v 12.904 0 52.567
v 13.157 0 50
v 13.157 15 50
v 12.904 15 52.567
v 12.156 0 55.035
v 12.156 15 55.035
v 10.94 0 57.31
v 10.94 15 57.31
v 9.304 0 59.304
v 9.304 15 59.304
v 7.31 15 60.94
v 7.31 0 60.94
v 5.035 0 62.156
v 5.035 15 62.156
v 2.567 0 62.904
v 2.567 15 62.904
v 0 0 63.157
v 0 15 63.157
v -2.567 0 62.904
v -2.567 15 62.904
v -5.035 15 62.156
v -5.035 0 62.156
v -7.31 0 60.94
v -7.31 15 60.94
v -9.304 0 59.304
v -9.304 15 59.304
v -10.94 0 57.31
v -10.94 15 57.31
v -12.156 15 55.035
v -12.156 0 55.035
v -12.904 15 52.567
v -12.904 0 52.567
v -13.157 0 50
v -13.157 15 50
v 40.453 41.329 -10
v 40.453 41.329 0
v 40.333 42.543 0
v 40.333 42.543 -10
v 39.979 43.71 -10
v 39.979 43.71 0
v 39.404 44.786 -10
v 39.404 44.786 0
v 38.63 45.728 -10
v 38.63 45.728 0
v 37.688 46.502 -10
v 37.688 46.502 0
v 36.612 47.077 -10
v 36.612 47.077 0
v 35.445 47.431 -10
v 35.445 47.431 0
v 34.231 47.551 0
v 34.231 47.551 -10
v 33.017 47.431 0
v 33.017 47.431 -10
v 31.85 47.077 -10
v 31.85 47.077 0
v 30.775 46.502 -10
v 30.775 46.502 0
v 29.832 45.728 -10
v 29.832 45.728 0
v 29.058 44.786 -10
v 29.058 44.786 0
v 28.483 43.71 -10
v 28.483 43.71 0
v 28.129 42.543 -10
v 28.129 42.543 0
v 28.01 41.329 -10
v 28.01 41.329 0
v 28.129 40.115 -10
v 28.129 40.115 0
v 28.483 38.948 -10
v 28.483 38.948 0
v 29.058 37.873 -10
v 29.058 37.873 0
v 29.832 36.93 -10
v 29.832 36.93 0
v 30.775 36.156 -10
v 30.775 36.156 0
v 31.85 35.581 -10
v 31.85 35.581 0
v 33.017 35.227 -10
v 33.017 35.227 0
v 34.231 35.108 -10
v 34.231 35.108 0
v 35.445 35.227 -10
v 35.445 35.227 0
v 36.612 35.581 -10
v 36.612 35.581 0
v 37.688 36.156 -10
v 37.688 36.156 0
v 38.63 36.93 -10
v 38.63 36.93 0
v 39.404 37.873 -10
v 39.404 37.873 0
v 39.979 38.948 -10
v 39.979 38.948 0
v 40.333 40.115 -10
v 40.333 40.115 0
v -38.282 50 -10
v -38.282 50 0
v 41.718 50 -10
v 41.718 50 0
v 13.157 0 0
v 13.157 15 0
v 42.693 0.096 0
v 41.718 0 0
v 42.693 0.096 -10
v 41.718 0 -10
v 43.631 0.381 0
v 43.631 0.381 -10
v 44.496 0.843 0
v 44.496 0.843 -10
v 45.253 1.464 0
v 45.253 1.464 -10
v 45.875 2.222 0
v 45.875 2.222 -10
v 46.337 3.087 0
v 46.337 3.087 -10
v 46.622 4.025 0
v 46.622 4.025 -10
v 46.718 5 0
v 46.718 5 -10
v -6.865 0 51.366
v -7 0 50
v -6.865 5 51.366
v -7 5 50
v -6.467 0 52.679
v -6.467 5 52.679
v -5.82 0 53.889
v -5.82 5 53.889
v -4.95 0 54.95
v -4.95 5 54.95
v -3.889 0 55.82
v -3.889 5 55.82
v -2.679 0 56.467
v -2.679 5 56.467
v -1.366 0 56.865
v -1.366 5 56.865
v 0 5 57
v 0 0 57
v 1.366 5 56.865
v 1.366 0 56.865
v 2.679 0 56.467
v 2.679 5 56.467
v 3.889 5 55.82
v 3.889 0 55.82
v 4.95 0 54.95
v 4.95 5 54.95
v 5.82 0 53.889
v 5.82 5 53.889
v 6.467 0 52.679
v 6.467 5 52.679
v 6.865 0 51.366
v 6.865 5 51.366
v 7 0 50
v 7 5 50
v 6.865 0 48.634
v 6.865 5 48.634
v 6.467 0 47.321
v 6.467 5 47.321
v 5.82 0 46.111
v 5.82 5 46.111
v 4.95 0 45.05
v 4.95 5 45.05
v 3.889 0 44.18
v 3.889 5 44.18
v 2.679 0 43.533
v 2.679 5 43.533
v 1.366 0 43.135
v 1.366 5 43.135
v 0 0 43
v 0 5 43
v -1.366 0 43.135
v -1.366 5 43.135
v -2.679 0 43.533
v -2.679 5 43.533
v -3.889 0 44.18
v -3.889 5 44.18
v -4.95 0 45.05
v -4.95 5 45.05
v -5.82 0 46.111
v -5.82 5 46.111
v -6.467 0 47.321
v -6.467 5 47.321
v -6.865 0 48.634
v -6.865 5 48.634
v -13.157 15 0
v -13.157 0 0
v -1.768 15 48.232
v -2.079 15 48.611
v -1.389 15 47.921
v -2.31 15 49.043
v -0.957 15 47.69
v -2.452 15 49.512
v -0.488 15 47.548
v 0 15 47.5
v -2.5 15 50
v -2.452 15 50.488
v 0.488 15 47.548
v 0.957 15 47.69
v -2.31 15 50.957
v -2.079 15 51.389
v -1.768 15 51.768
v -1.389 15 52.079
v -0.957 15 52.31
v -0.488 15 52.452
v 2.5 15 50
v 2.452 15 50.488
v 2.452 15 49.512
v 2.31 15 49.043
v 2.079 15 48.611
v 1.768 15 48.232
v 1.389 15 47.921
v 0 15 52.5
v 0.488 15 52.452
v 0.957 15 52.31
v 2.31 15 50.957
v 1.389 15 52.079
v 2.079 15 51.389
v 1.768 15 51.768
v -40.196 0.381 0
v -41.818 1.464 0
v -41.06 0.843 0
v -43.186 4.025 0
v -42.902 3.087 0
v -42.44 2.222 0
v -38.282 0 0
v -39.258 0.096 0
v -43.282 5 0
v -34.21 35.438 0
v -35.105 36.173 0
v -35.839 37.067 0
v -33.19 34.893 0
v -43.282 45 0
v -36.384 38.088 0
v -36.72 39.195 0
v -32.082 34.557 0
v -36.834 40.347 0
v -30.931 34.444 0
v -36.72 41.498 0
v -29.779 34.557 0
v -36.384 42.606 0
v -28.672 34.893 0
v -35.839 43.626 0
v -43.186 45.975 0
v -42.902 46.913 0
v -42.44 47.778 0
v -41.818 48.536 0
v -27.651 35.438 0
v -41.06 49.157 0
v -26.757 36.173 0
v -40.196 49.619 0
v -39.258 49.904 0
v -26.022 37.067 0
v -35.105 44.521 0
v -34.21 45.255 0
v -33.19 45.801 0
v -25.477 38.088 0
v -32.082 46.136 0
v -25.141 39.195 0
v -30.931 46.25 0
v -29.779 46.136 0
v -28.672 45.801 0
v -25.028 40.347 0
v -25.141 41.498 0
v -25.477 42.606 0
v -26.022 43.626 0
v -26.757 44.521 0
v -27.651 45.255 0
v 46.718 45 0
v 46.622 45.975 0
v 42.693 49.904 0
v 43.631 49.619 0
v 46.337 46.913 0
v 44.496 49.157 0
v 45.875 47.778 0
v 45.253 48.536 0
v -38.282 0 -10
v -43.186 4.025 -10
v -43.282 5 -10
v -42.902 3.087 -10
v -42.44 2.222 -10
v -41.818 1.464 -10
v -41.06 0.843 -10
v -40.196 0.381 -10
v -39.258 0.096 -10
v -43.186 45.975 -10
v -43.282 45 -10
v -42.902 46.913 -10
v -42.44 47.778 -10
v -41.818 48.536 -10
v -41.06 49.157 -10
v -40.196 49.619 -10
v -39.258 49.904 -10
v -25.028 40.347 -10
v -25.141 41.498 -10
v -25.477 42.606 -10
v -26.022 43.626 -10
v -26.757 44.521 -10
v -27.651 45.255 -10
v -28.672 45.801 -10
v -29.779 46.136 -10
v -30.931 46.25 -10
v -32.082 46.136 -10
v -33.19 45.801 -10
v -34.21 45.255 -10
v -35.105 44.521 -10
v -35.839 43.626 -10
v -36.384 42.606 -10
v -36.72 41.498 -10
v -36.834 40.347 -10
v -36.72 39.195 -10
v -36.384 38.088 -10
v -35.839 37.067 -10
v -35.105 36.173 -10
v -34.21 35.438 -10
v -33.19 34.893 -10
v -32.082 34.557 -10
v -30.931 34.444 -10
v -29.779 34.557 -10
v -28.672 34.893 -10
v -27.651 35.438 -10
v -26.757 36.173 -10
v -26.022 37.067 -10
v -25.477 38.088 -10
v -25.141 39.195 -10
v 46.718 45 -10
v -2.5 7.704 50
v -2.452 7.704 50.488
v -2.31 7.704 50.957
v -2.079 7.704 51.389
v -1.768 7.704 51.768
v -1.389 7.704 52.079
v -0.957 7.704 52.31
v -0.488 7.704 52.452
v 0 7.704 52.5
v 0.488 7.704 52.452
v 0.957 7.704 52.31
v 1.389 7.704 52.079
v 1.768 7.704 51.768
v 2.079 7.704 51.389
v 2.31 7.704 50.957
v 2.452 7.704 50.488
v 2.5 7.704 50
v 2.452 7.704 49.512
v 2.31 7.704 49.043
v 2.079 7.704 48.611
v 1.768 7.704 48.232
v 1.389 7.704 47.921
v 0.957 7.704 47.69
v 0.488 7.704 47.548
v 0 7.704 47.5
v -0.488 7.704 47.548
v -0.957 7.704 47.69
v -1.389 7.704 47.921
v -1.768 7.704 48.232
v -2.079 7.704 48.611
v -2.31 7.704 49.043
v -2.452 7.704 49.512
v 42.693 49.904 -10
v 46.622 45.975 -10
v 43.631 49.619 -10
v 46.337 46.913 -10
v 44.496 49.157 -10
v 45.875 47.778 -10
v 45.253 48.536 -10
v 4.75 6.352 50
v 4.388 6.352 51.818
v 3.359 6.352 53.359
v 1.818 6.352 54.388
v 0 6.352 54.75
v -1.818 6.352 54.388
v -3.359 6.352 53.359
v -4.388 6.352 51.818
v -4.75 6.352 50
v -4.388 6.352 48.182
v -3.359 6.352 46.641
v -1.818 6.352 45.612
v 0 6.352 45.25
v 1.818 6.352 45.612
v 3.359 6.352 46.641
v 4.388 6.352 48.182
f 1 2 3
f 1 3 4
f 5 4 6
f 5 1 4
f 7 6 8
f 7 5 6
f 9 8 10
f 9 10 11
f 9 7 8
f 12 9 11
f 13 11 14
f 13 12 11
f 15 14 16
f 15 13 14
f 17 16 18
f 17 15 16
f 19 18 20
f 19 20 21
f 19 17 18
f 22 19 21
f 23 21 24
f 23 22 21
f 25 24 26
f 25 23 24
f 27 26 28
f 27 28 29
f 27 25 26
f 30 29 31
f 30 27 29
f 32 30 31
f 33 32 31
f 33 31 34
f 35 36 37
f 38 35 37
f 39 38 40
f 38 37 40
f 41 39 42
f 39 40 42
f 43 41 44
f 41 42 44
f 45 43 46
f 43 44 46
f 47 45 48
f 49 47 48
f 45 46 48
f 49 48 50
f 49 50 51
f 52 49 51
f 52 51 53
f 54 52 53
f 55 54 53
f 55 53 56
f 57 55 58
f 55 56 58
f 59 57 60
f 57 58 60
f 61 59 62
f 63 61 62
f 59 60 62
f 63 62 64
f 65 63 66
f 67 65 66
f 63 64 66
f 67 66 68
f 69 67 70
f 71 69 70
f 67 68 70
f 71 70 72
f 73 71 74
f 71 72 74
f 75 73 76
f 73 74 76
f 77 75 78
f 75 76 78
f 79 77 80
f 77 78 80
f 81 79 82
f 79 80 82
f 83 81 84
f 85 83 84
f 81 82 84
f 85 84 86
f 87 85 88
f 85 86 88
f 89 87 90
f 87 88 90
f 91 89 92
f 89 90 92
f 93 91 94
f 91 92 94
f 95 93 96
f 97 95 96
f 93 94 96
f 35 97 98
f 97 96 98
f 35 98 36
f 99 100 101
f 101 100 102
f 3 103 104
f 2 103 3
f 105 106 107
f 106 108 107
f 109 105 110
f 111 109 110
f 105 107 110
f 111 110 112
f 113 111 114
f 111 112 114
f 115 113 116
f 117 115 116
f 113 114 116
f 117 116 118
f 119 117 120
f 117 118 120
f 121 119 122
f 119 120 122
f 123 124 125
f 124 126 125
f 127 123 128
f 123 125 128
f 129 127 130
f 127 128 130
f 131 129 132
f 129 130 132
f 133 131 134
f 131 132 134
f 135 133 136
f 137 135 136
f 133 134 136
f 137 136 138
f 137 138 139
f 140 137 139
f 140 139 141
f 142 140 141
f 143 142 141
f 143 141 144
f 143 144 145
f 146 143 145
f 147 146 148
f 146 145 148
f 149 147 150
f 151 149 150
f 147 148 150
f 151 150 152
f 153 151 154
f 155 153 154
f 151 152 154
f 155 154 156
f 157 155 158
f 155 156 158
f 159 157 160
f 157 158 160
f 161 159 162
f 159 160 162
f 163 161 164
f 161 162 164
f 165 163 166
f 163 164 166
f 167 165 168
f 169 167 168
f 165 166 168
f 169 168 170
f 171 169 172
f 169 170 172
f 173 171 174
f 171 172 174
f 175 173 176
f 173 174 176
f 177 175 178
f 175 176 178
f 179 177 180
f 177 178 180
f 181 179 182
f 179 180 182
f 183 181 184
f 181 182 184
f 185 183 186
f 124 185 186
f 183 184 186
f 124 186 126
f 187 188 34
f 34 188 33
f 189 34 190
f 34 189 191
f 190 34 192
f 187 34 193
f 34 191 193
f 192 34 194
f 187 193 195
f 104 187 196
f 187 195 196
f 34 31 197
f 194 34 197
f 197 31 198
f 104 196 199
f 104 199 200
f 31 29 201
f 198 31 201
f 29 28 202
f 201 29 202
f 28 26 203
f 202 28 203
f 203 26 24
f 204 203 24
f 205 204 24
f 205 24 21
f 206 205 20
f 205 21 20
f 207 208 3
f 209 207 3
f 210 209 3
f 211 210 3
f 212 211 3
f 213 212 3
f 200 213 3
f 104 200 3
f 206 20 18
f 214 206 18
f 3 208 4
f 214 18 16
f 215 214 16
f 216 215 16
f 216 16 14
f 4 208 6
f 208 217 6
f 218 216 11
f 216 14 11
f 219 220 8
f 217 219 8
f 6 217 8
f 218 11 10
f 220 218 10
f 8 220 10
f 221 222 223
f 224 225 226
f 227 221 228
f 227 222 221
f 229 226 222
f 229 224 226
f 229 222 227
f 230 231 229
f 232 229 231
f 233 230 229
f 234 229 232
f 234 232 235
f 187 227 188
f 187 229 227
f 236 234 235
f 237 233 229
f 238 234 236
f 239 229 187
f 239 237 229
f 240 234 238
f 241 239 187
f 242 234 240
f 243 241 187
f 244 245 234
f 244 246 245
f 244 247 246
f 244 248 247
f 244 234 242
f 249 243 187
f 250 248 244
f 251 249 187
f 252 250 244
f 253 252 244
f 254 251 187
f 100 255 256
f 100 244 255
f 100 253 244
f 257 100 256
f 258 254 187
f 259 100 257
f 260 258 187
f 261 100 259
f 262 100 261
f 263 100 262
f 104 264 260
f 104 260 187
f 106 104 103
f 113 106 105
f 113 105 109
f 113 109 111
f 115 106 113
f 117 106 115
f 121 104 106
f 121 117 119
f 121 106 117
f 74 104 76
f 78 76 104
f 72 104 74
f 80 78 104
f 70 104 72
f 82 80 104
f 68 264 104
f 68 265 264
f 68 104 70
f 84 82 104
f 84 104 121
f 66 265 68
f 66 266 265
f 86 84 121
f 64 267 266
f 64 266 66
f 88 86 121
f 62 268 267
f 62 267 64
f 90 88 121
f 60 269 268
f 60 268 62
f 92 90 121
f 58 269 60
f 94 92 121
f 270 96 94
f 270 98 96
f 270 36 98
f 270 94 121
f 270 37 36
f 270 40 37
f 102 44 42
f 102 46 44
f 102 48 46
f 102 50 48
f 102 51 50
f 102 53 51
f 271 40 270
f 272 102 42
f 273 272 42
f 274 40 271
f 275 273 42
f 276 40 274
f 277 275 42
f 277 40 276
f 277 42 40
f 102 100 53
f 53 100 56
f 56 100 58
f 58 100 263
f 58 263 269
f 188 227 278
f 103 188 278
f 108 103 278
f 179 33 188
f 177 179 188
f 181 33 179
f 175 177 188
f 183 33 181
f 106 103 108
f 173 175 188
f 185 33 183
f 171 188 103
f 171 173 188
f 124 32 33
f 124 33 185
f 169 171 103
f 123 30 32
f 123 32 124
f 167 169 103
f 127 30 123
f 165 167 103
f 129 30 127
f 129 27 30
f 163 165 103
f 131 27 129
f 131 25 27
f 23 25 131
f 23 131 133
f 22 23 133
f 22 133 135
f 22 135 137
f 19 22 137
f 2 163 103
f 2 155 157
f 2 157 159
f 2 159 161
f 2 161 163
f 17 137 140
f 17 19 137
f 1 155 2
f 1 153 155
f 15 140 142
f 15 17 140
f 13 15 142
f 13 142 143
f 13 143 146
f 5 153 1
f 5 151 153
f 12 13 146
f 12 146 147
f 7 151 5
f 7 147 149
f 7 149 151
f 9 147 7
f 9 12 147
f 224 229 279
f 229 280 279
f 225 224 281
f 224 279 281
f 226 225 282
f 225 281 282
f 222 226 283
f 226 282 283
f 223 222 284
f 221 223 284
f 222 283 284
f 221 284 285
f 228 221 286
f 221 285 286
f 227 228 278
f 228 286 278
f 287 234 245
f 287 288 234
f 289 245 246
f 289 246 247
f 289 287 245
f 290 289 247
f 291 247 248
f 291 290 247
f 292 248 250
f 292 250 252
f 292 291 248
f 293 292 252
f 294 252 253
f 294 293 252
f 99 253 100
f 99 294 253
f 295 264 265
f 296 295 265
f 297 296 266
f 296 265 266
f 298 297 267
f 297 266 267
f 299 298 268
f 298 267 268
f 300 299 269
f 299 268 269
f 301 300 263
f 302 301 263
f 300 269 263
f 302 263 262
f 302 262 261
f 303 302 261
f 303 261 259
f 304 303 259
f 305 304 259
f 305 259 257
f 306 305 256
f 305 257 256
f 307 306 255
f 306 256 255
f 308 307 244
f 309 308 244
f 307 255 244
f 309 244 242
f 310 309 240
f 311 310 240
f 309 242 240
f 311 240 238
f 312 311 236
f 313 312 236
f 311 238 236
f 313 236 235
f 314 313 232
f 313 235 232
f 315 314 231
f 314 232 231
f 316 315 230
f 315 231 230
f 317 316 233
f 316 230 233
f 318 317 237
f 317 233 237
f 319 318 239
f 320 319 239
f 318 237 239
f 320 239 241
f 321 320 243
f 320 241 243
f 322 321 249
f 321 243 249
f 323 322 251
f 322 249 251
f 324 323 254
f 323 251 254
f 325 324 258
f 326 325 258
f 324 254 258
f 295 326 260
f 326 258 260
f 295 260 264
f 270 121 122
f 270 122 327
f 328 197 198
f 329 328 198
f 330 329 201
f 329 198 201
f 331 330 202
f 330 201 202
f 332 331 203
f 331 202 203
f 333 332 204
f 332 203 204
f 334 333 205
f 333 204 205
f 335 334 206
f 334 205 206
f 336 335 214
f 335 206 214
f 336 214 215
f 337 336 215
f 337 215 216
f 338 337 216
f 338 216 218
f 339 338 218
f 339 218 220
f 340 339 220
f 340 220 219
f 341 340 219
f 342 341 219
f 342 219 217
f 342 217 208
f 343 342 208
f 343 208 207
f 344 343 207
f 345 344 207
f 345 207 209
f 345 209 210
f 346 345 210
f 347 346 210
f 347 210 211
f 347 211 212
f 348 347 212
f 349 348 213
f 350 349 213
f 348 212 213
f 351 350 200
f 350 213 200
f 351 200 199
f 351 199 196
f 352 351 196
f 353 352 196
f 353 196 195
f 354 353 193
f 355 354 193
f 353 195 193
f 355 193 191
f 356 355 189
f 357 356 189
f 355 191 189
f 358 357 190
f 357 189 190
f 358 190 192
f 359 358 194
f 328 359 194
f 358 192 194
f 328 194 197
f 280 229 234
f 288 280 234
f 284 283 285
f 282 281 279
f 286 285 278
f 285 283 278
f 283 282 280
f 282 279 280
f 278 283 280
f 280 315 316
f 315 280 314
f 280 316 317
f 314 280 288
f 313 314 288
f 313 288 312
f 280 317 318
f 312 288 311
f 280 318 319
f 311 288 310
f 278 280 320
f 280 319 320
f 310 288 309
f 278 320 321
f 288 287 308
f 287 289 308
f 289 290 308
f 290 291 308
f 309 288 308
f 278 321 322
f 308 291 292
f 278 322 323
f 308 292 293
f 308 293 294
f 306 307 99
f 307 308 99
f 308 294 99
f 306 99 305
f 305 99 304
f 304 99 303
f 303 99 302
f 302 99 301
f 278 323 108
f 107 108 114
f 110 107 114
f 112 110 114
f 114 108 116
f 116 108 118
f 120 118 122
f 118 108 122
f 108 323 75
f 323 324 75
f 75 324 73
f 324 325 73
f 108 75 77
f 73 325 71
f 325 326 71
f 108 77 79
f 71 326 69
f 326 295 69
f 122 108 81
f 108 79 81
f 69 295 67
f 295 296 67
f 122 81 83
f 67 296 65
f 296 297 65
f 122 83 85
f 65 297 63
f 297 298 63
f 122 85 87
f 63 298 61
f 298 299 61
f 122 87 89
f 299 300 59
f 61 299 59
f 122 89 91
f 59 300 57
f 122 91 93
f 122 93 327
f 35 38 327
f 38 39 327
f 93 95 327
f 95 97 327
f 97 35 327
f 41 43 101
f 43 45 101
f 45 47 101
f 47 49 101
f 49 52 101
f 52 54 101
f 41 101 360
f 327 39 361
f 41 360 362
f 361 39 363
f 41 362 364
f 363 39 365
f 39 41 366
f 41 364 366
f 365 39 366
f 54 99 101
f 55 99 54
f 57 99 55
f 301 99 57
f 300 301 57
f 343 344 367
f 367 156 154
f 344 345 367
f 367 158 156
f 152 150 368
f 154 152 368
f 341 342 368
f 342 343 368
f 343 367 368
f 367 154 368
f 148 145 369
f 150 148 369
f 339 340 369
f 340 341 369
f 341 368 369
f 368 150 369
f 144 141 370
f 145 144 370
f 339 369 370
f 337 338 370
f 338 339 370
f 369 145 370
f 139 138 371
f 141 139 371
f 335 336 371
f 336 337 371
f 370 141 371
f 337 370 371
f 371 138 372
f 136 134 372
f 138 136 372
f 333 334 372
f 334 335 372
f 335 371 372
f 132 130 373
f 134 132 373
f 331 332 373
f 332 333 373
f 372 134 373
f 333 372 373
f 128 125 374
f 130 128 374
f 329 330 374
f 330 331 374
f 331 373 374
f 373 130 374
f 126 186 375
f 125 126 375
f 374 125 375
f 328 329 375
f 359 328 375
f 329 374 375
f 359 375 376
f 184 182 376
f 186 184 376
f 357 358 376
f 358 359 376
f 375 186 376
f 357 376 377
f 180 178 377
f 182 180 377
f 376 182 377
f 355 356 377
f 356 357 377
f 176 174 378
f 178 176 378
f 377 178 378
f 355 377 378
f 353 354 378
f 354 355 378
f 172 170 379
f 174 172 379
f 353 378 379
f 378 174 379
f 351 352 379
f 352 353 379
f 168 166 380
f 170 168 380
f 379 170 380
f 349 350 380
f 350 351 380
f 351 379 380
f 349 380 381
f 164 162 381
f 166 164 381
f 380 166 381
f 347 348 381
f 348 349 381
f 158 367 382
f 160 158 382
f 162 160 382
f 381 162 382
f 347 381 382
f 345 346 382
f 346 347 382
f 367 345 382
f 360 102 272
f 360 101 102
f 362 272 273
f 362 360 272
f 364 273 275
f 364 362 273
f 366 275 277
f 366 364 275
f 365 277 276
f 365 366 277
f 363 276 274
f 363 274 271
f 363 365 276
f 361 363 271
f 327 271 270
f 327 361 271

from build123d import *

# Parameters (mm, degrees)
F0_W     = 90
F0_H     = 50
F0_R     = 5.9031202678
F0_R_2   = 6.221473217
F2_DEPTH = 10
F1_W     = 26.3143666089
F1_H     = 50
F3_DEPTH = 15
F4_R     = 5
F5_D     = 14
F5_DEPTH = 5
F5_TIP   = 4.2060243332
F6_D     = 5


with BuildPart() as f2:
    # F0 (on Top) → F2 (new body)
    with BuildSketch(Plane.XY):
        with Locations((1.7176882843, 25)):
            Rectangle(F0_W, F0_H)
        with Locations((-30.9307053685, 40.3467603028)):
            Circle(F0_R, mode=Mode.SUBTRACT)
        with Locations((34.2310518026, 41.3290970027)):
            Circle(F0_R_2, mode=Mode.SUBTRACT)
    extrude(amount=-F2_DEPTH)

    # F1 (on Front) → F3 (join)
    with BuildSketch(Plane.XZ):
        with Locations((0, 25)):
            Rectangle(F1_W, F1_H)
        with BuildLine():
            Line((-13.1571833044, 50), (13.1571833044, 50))
            ThreePointArc((13.1571833044, 50), (0, 63.1571833044), (-13.1571833044, 50))
        make_face()
    extrude(amount=-F3_DEPTH)

    # F4
    f4_edges = [f2.edges().sort_by_distance(p)[0] for p in [
        (46.717688, 0, -5),
        (46.717688, 50, -5),
        (-43.282312, 50, -5),
        (-43.282312, 0, -5),
    ]]
    fillet(f4_edges, radius=F4_R)

    # F5
    with Locations(Plane.XZ):
        with Locations((0, 50)):
            Hole(F5_D / 2, depth=F5_DEPTH)
            with Locations((0, 0, -(F5_DEPTH + F5_TIP / 2))):  # 118° drill point
                Cone(0, F5_D / 2, F5_TIP, mode=Mode.SUBTRACT)

    # F6 (through all)
    with Locations(Plane.XZ):
        with Locations((0, 50)):
            Hole(F6_D / 2)


solid = f2.part
